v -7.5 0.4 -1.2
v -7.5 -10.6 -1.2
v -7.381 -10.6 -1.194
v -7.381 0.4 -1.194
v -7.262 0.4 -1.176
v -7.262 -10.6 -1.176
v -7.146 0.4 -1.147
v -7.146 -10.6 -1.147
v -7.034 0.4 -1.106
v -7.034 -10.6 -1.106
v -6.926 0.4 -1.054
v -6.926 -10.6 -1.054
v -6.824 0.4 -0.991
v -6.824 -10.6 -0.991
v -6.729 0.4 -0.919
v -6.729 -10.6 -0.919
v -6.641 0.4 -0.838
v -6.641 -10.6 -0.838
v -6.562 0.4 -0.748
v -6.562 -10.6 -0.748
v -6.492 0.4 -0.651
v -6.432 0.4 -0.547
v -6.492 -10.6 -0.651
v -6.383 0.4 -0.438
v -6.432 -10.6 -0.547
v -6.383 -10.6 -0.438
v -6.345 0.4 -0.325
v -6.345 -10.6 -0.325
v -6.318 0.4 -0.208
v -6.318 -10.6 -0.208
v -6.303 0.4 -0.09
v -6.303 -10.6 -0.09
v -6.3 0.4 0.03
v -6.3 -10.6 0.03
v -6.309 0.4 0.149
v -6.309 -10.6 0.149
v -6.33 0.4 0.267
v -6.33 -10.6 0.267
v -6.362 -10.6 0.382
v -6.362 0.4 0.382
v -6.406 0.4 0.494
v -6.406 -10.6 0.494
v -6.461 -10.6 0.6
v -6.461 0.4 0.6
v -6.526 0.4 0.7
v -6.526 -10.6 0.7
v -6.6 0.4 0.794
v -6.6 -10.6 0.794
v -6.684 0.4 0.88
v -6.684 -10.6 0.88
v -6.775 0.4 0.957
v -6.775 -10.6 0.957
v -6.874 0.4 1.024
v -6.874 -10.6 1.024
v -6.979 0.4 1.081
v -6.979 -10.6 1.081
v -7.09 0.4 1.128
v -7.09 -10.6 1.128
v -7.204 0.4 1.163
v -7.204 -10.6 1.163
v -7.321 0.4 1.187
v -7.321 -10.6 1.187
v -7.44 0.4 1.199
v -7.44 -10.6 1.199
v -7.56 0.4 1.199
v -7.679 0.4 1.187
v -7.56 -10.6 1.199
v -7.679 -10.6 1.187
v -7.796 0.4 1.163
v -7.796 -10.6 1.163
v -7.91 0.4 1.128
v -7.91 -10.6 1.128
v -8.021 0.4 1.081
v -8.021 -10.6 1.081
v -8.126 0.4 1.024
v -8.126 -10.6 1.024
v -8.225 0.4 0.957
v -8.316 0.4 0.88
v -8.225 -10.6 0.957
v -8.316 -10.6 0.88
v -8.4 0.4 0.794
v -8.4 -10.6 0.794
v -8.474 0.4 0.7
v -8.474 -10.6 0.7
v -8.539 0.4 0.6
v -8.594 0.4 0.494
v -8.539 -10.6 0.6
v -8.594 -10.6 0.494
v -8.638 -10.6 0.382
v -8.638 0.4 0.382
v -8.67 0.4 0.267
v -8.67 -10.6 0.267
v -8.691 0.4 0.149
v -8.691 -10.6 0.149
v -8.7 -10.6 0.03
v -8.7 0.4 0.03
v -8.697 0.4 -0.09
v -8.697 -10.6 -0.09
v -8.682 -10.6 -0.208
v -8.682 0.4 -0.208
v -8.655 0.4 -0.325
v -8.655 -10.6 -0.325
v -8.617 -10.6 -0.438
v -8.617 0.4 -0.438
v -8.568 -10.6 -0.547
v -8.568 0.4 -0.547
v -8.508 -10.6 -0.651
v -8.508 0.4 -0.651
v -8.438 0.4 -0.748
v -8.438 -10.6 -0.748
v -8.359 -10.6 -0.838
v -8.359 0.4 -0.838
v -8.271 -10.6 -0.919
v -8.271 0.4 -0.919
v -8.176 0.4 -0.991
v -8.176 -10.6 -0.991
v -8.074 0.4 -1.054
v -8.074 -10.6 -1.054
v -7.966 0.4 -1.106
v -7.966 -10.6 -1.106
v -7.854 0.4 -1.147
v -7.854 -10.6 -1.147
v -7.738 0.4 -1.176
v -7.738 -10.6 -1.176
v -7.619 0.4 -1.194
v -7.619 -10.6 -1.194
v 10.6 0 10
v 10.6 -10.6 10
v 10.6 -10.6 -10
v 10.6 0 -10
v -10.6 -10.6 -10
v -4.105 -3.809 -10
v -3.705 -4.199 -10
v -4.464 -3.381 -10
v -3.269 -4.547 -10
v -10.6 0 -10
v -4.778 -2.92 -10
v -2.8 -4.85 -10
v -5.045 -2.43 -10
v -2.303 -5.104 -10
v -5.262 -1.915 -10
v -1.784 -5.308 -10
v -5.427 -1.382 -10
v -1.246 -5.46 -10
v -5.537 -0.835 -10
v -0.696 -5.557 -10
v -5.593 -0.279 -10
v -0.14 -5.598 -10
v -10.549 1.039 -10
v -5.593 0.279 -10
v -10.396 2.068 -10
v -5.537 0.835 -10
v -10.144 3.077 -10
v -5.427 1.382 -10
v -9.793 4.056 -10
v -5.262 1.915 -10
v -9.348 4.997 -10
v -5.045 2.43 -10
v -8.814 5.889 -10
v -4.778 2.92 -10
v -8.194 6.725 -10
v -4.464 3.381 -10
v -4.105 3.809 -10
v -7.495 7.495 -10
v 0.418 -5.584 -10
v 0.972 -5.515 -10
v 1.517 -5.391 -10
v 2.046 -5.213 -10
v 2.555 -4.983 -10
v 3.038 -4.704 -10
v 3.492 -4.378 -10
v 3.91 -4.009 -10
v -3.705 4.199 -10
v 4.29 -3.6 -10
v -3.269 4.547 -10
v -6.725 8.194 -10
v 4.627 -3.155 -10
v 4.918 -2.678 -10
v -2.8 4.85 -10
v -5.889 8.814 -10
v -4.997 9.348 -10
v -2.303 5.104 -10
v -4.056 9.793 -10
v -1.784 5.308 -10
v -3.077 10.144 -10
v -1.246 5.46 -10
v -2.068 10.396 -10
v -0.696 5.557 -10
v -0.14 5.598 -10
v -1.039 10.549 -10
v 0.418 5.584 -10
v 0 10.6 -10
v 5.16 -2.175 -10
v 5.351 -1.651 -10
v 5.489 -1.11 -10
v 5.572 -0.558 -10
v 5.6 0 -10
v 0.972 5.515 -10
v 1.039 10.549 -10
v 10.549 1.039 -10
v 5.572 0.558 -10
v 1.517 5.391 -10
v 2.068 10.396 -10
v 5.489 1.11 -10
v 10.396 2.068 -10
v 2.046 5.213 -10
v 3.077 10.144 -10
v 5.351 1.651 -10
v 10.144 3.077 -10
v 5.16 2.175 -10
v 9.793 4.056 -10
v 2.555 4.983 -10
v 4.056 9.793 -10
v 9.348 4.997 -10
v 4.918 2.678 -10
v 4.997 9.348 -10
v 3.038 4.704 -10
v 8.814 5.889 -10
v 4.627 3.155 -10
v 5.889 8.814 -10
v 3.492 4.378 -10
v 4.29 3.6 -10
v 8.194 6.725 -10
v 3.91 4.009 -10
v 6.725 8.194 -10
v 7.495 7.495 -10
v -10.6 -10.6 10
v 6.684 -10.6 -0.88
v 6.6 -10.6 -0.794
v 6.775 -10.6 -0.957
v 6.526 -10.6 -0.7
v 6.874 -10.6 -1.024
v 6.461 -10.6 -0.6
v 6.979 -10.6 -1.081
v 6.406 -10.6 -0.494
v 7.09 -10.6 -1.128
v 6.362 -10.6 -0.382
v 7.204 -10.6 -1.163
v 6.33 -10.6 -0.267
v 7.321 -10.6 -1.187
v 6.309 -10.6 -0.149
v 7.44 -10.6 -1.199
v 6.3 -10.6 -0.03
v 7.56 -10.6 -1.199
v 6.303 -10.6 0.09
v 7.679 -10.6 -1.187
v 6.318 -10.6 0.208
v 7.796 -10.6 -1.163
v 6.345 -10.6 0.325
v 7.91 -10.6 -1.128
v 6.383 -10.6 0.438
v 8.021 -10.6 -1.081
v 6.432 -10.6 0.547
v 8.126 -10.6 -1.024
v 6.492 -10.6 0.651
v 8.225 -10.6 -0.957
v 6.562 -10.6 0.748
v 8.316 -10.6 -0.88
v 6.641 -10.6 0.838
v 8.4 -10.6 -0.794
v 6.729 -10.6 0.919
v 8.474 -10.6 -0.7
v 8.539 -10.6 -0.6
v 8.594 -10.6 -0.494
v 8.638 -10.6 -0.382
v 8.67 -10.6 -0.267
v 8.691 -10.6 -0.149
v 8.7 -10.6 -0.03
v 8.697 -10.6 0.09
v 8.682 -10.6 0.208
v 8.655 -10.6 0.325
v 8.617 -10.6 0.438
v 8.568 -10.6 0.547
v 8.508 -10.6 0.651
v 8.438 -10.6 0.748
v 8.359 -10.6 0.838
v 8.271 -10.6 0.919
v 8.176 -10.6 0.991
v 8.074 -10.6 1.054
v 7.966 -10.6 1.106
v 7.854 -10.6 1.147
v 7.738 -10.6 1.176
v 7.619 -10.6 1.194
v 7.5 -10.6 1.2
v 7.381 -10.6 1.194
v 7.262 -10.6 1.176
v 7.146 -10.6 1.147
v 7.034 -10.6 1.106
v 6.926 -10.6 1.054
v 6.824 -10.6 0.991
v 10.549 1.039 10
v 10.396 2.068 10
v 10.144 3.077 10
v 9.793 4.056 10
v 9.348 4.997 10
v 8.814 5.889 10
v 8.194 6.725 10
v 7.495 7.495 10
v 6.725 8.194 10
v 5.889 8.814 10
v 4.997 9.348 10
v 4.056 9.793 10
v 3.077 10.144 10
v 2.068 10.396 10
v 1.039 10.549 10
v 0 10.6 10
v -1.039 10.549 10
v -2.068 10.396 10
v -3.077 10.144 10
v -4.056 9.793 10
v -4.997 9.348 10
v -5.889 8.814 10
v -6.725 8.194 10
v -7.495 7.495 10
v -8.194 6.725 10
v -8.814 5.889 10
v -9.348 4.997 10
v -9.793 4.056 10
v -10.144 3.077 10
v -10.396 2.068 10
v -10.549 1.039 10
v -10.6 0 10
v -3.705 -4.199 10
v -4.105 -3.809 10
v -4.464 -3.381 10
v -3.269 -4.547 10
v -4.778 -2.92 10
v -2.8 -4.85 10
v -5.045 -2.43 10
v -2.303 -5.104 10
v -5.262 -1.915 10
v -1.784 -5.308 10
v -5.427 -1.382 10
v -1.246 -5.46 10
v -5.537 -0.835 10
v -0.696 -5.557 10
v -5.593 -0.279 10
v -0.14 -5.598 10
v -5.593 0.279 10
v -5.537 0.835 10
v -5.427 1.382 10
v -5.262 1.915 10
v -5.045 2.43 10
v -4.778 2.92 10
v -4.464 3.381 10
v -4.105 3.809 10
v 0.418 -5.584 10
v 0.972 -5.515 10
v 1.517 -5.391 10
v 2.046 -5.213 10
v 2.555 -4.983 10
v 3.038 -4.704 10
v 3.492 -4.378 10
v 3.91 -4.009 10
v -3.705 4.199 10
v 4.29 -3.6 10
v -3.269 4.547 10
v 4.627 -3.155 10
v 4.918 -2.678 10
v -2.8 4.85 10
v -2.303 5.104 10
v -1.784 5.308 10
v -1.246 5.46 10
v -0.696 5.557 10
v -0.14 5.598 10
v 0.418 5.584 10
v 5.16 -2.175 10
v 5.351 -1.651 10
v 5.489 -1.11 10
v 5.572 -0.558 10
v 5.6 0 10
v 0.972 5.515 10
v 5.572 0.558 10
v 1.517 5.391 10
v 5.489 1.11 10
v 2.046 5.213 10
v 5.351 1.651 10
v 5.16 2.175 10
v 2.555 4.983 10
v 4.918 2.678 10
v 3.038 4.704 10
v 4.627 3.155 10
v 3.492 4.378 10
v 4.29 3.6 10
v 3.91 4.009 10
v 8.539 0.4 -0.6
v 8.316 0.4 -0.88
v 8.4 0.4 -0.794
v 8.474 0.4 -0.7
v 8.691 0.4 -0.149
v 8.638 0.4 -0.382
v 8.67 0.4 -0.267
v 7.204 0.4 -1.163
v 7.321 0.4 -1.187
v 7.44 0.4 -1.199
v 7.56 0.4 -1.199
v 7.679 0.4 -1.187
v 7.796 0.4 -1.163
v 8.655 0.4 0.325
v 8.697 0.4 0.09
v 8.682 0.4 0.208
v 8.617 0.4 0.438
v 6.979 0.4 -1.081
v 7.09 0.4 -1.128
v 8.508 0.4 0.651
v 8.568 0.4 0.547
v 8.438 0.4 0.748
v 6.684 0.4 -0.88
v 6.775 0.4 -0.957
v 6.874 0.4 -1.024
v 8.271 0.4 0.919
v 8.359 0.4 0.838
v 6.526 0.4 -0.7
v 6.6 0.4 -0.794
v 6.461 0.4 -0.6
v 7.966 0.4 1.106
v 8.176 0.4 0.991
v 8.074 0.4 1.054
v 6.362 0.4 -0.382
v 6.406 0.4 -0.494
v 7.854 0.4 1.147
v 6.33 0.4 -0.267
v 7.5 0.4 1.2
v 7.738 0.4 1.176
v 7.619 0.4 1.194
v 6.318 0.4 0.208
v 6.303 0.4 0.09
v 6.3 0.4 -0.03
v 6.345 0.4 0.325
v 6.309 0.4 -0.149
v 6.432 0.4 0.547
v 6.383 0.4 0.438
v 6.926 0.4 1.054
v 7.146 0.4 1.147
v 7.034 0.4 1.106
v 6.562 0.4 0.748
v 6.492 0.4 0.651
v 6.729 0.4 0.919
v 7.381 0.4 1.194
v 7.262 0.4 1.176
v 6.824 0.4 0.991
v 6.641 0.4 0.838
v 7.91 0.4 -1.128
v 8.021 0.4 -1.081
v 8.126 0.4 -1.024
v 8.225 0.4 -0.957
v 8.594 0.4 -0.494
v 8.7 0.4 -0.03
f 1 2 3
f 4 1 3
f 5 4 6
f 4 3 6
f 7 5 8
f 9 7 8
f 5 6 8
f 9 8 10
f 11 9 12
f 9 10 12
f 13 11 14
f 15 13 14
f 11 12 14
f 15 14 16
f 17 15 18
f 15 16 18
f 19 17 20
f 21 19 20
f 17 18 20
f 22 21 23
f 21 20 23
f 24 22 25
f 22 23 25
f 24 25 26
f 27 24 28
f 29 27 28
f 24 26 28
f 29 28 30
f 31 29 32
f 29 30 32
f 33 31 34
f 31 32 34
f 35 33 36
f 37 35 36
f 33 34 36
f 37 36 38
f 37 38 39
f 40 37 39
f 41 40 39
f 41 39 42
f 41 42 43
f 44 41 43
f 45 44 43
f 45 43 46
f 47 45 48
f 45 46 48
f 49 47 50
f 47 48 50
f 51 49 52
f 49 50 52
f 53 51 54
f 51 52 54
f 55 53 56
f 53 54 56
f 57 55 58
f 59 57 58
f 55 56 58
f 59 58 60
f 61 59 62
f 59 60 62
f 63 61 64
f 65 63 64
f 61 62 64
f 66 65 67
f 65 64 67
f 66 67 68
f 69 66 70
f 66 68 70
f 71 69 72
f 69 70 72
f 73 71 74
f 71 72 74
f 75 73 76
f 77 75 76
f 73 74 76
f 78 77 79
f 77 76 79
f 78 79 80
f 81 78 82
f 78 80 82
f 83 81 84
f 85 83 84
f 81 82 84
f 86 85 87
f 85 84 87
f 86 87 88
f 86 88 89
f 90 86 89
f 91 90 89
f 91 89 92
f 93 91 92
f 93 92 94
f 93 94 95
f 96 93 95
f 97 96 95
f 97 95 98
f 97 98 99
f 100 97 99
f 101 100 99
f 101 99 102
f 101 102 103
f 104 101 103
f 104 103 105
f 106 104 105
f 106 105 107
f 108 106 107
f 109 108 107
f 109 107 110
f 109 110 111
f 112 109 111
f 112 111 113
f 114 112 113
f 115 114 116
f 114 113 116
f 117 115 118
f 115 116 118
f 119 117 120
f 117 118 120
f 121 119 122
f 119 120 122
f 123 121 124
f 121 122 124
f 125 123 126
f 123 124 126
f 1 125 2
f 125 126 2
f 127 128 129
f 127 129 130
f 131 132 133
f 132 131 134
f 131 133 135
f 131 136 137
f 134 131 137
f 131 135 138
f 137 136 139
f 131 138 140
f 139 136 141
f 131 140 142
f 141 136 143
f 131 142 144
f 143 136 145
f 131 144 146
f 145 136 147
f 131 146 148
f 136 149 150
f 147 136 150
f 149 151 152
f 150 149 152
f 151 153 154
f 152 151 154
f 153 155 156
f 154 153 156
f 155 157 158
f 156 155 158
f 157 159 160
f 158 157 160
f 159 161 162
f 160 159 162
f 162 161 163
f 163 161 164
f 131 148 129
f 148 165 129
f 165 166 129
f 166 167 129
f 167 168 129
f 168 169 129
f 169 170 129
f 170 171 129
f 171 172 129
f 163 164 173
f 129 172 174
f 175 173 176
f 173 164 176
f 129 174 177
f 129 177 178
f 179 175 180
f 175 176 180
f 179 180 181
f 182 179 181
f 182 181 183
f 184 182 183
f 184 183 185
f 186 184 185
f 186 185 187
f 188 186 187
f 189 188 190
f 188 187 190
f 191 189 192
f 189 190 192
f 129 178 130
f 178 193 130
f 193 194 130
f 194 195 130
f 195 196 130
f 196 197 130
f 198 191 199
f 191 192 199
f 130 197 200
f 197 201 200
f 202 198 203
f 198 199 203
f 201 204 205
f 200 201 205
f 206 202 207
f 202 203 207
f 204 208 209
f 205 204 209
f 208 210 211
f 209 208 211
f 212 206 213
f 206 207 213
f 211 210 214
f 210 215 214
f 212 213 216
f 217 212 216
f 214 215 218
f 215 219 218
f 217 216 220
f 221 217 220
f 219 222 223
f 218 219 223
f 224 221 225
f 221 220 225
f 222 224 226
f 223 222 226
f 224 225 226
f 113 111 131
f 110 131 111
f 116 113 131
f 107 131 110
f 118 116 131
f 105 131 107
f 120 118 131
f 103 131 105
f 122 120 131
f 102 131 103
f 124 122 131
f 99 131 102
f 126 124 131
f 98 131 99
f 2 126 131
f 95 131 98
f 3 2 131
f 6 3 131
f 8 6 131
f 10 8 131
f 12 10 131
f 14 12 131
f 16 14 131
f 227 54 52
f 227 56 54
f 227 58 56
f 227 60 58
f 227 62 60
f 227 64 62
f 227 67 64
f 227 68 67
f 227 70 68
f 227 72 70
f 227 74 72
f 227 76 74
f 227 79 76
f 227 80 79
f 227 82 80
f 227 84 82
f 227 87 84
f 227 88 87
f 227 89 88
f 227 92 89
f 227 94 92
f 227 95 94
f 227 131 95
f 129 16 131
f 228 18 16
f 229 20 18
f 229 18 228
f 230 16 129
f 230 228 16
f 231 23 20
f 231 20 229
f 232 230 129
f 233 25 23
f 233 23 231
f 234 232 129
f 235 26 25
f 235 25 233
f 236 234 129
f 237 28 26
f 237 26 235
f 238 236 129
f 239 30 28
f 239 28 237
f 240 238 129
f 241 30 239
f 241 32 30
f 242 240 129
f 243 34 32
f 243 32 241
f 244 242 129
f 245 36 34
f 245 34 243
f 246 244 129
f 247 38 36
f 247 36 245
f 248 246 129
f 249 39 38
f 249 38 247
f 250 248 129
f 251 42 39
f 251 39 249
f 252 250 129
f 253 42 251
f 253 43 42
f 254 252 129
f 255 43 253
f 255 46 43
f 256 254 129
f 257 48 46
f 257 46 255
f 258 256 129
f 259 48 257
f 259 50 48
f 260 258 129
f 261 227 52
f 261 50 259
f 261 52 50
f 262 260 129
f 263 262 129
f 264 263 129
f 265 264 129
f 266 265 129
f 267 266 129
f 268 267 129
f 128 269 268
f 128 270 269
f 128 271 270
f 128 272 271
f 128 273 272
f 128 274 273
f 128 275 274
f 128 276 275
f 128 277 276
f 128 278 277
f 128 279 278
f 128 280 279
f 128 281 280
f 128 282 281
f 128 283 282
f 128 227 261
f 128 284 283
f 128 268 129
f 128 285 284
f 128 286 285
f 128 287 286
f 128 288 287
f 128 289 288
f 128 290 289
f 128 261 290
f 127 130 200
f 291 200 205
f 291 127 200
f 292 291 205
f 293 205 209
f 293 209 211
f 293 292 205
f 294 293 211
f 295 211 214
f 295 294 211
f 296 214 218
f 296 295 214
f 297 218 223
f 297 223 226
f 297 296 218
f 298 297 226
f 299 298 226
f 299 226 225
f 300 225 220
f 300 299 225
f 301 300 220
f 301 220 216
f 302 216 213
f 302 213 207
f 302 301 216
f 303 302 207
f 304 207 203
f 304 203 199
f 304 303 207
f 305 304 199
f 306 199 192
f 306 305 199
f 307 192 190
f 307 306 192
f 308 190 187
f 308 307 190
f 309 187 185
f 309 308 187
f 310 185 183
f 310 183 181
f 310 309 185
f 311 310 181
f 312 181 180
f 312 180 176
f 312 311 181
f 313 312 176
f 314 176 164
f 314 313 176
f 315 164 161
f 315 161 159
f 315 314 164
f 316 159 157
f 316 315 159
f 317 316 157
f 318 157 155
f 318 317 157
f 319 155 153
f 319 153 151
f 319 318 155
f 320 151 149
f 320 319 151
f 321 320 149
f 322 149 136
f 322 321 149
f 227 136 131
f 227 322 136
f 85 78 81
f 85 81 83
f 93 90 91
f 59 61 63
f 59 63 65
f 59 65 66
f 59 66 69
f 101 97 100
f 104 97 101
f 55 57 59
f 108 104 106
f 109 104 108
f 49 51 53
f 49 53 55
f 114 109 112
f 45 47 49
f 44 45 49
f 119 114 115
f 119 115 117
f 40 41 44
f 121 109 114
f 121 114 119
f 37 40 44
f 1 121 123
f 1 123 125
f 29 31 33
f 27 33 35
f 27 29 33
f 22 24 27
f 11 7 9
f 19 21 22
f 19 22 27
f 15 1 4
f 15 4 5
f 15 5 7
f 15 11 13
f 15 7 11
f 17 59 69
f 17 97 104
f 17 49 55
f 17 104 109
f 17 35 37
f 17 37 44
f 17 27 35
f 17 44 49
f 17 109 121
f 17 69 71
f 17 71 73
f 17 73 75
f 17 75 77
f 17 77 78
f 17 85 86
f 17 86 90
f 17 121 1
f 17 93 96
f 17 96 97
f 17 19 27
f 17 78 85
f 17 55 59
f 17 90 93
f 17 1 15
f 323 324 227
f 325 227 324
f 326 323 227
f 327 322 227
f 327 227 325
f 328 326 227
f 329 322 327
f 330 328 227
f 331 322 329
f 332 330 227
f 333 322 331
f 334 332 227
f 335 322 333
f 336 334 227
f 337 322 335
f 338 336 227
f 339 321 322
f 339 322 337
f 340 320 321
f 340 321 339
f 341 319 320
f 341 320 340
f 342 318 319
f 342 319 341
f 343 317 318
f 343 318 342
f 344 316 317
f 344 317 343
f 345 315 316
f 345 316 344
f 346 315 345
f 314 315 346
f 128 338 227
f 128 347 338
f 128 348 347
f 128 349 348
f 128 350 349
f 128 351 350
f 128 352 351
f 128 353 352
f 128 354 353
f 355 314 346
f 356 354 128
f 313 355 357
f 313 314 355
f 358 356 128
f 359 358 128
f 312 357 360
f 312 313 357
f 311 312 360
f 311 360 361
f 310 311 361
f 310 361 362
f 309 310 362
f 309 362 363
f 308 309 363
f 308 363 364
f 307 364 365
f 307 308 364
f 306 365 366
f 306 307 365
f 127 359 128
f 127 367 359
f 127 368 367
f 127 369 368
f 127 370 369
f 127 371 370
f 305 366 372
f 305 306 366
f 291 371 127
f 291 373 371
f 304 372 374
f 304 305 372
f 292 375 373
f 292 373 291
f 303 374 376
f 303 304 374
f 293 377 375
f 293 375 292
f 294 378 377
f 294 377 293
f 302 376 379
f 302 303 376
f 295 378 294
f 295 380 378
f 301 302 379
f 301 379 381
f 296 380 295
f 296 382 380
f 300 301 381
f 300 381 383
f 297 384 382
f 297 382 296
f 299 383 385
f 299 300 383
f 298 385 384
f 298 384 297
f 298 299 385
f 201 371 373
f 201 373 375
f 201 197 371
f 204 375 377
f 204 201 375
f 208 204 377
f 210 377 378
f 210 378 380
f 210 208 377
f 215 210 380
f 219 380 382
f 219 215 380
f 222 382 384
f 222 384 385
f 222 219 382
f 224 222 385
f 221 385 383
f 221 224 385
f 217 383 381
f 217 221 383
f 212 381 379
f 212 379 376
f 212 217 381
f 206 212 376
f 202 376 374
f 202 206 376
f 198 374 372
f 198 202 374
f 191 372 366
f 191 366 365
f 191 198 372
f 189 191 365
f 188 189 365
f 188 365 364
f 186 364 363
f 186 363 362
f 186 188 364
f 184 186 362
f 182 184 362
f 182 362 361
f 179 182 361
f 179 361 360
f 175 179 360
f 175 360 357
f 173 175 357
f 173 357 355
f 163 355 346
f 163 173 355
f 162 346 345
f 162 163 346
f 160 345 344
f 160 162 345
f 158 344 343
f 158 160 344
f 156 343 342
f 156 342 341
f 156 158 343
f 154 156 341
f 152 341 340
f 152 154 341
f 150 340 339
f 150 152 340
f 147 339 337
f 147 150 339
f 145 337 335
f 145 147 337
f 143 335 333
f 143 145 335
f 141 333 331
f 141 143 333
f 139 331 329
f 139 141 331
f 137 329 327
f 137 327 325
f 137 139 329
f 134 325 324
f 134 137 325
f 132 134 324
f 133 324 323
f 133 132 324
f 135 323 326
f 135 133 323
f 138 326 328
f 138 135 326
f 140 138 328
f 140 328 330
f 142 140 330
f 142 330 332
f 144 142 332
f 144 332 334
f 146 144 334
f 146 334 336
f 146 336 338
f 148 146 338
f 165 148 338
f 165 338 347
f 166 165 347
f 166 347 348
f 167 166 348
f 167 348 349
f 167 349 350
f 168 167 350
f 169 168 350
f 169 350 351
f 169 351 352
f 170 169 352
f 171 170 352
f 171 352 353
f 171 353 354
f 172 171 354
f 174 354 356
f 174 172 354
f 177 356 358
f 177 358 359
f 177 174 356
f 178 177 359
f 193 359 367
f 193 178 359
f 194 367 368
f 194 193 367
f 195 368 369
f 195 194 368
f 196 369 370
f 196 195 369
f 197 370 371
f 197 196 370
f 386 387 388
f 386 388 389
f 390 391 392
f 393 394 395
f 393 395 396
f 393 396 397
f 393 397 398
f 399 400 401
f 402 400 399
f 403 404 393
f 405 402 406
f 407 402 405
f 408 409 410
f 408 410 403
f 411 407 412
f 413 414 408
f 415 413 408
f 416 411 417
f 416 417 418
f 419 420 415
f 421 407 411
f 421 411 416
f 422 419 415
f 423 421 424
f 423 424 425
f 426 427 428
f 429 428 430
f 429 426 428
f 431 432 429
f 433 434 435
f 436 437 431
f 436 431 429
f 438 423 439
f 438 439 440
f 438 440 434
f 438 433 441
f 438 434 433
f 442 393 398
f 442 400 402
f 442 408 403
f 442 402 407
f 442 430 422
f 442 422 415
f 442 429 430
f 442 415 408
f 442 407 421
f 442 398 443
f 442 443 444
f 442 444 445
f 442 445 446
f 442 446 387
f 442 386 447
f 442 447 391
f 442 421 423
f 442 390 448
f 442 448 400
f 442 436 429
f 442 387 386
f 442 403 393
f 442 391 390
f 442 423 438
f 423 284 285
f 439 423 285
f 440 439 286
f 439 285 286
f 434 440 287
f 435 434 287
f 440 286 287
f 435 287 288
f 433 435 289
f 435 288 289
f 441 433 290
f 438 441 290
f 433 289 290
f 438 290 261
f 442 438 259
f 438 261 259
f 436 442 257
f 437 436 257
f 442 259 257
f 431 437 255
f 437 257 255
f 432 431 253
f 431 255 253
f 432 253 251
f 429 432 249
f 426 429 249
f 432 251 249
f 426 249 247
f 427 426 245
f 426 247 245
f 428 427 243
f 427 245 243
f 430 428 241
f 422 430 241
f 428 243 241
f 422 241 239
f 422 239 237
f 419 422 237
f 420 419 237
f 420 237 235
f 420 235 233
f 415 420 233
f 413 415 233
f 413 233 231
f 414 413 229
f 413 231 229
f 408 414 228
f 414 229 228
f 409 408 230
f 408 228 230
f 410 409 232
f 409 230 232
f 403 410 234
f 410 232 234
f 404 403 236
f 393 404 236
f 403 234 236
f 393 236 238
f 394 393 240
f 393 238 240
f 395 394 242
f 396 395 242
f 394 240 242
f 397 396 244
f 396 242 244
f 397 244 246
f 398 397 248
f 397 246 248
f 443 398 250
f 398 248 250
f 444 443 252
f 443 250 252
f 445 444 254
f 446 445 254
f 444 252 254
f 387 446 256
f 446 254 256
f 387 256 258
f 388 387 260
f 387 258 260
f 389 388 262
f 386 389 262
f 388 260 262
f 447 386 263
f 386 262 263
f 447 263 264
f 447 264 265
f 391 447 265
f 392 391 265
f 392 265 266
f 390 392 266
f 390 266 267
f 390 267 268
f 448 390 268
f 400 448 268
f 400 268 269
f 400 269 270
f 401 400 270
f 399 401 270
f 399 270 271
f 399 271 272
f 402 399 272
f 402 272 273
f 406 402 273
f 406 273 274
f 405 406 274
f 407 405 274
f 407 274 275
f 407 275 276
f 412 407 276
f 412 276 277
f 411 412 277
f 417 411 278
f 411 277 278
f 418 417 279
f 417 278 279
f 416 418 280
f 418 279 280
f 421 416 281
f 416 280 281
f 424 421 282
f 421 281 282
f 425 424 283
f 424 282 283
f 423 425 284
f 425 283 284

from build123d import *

# Parameters (mm, degrees)
SKETCH_1_R            = 5.6
EXTRUDE_394_DEPTH     = 10
SKETCH_3_R            = 1.2
CUT_EXTRUDE_678_DEPTH = 11


with BuildPart() as part:
    # Эскиз1 → Extrude 394 (new, symmetric)
    with BuildSketch(Plane.XY):
        with BuildLine():
            Line((-10.6, 0), (-10.6, -10.6))
            Line((-10.6, -10.6), (10.6, -10.6))
            Line((10.6, -10.6), (10.6, 0))
            ThreePointArc((10.6, 0), (0, 10.6), (-10.6, 0))
        make_face()
        Circle(SKETCH_1_R, mode=Mode.SUBTRACT)
    extrude(amount=EXTRUDE_394_DEPTH, both=True)

    # Эскиз3 → Cut-Extrude 678 (cut)
    with BuildSketch(Plane.XZ.offset(10.6)):
        with Locations(Location((-7.5, 0, 0), (0, 0, 270))):
            Circle(SKETCH_3_R)
        with Locations(Location((7.5, 0, 0), (0, 0, 90))):
            Circle(SKETCH_3_R)
    extrude(amount=-CUT_EXTRUDE_678_DEPTH, mode=Mode.SUBTRACT)


solid = part.part
